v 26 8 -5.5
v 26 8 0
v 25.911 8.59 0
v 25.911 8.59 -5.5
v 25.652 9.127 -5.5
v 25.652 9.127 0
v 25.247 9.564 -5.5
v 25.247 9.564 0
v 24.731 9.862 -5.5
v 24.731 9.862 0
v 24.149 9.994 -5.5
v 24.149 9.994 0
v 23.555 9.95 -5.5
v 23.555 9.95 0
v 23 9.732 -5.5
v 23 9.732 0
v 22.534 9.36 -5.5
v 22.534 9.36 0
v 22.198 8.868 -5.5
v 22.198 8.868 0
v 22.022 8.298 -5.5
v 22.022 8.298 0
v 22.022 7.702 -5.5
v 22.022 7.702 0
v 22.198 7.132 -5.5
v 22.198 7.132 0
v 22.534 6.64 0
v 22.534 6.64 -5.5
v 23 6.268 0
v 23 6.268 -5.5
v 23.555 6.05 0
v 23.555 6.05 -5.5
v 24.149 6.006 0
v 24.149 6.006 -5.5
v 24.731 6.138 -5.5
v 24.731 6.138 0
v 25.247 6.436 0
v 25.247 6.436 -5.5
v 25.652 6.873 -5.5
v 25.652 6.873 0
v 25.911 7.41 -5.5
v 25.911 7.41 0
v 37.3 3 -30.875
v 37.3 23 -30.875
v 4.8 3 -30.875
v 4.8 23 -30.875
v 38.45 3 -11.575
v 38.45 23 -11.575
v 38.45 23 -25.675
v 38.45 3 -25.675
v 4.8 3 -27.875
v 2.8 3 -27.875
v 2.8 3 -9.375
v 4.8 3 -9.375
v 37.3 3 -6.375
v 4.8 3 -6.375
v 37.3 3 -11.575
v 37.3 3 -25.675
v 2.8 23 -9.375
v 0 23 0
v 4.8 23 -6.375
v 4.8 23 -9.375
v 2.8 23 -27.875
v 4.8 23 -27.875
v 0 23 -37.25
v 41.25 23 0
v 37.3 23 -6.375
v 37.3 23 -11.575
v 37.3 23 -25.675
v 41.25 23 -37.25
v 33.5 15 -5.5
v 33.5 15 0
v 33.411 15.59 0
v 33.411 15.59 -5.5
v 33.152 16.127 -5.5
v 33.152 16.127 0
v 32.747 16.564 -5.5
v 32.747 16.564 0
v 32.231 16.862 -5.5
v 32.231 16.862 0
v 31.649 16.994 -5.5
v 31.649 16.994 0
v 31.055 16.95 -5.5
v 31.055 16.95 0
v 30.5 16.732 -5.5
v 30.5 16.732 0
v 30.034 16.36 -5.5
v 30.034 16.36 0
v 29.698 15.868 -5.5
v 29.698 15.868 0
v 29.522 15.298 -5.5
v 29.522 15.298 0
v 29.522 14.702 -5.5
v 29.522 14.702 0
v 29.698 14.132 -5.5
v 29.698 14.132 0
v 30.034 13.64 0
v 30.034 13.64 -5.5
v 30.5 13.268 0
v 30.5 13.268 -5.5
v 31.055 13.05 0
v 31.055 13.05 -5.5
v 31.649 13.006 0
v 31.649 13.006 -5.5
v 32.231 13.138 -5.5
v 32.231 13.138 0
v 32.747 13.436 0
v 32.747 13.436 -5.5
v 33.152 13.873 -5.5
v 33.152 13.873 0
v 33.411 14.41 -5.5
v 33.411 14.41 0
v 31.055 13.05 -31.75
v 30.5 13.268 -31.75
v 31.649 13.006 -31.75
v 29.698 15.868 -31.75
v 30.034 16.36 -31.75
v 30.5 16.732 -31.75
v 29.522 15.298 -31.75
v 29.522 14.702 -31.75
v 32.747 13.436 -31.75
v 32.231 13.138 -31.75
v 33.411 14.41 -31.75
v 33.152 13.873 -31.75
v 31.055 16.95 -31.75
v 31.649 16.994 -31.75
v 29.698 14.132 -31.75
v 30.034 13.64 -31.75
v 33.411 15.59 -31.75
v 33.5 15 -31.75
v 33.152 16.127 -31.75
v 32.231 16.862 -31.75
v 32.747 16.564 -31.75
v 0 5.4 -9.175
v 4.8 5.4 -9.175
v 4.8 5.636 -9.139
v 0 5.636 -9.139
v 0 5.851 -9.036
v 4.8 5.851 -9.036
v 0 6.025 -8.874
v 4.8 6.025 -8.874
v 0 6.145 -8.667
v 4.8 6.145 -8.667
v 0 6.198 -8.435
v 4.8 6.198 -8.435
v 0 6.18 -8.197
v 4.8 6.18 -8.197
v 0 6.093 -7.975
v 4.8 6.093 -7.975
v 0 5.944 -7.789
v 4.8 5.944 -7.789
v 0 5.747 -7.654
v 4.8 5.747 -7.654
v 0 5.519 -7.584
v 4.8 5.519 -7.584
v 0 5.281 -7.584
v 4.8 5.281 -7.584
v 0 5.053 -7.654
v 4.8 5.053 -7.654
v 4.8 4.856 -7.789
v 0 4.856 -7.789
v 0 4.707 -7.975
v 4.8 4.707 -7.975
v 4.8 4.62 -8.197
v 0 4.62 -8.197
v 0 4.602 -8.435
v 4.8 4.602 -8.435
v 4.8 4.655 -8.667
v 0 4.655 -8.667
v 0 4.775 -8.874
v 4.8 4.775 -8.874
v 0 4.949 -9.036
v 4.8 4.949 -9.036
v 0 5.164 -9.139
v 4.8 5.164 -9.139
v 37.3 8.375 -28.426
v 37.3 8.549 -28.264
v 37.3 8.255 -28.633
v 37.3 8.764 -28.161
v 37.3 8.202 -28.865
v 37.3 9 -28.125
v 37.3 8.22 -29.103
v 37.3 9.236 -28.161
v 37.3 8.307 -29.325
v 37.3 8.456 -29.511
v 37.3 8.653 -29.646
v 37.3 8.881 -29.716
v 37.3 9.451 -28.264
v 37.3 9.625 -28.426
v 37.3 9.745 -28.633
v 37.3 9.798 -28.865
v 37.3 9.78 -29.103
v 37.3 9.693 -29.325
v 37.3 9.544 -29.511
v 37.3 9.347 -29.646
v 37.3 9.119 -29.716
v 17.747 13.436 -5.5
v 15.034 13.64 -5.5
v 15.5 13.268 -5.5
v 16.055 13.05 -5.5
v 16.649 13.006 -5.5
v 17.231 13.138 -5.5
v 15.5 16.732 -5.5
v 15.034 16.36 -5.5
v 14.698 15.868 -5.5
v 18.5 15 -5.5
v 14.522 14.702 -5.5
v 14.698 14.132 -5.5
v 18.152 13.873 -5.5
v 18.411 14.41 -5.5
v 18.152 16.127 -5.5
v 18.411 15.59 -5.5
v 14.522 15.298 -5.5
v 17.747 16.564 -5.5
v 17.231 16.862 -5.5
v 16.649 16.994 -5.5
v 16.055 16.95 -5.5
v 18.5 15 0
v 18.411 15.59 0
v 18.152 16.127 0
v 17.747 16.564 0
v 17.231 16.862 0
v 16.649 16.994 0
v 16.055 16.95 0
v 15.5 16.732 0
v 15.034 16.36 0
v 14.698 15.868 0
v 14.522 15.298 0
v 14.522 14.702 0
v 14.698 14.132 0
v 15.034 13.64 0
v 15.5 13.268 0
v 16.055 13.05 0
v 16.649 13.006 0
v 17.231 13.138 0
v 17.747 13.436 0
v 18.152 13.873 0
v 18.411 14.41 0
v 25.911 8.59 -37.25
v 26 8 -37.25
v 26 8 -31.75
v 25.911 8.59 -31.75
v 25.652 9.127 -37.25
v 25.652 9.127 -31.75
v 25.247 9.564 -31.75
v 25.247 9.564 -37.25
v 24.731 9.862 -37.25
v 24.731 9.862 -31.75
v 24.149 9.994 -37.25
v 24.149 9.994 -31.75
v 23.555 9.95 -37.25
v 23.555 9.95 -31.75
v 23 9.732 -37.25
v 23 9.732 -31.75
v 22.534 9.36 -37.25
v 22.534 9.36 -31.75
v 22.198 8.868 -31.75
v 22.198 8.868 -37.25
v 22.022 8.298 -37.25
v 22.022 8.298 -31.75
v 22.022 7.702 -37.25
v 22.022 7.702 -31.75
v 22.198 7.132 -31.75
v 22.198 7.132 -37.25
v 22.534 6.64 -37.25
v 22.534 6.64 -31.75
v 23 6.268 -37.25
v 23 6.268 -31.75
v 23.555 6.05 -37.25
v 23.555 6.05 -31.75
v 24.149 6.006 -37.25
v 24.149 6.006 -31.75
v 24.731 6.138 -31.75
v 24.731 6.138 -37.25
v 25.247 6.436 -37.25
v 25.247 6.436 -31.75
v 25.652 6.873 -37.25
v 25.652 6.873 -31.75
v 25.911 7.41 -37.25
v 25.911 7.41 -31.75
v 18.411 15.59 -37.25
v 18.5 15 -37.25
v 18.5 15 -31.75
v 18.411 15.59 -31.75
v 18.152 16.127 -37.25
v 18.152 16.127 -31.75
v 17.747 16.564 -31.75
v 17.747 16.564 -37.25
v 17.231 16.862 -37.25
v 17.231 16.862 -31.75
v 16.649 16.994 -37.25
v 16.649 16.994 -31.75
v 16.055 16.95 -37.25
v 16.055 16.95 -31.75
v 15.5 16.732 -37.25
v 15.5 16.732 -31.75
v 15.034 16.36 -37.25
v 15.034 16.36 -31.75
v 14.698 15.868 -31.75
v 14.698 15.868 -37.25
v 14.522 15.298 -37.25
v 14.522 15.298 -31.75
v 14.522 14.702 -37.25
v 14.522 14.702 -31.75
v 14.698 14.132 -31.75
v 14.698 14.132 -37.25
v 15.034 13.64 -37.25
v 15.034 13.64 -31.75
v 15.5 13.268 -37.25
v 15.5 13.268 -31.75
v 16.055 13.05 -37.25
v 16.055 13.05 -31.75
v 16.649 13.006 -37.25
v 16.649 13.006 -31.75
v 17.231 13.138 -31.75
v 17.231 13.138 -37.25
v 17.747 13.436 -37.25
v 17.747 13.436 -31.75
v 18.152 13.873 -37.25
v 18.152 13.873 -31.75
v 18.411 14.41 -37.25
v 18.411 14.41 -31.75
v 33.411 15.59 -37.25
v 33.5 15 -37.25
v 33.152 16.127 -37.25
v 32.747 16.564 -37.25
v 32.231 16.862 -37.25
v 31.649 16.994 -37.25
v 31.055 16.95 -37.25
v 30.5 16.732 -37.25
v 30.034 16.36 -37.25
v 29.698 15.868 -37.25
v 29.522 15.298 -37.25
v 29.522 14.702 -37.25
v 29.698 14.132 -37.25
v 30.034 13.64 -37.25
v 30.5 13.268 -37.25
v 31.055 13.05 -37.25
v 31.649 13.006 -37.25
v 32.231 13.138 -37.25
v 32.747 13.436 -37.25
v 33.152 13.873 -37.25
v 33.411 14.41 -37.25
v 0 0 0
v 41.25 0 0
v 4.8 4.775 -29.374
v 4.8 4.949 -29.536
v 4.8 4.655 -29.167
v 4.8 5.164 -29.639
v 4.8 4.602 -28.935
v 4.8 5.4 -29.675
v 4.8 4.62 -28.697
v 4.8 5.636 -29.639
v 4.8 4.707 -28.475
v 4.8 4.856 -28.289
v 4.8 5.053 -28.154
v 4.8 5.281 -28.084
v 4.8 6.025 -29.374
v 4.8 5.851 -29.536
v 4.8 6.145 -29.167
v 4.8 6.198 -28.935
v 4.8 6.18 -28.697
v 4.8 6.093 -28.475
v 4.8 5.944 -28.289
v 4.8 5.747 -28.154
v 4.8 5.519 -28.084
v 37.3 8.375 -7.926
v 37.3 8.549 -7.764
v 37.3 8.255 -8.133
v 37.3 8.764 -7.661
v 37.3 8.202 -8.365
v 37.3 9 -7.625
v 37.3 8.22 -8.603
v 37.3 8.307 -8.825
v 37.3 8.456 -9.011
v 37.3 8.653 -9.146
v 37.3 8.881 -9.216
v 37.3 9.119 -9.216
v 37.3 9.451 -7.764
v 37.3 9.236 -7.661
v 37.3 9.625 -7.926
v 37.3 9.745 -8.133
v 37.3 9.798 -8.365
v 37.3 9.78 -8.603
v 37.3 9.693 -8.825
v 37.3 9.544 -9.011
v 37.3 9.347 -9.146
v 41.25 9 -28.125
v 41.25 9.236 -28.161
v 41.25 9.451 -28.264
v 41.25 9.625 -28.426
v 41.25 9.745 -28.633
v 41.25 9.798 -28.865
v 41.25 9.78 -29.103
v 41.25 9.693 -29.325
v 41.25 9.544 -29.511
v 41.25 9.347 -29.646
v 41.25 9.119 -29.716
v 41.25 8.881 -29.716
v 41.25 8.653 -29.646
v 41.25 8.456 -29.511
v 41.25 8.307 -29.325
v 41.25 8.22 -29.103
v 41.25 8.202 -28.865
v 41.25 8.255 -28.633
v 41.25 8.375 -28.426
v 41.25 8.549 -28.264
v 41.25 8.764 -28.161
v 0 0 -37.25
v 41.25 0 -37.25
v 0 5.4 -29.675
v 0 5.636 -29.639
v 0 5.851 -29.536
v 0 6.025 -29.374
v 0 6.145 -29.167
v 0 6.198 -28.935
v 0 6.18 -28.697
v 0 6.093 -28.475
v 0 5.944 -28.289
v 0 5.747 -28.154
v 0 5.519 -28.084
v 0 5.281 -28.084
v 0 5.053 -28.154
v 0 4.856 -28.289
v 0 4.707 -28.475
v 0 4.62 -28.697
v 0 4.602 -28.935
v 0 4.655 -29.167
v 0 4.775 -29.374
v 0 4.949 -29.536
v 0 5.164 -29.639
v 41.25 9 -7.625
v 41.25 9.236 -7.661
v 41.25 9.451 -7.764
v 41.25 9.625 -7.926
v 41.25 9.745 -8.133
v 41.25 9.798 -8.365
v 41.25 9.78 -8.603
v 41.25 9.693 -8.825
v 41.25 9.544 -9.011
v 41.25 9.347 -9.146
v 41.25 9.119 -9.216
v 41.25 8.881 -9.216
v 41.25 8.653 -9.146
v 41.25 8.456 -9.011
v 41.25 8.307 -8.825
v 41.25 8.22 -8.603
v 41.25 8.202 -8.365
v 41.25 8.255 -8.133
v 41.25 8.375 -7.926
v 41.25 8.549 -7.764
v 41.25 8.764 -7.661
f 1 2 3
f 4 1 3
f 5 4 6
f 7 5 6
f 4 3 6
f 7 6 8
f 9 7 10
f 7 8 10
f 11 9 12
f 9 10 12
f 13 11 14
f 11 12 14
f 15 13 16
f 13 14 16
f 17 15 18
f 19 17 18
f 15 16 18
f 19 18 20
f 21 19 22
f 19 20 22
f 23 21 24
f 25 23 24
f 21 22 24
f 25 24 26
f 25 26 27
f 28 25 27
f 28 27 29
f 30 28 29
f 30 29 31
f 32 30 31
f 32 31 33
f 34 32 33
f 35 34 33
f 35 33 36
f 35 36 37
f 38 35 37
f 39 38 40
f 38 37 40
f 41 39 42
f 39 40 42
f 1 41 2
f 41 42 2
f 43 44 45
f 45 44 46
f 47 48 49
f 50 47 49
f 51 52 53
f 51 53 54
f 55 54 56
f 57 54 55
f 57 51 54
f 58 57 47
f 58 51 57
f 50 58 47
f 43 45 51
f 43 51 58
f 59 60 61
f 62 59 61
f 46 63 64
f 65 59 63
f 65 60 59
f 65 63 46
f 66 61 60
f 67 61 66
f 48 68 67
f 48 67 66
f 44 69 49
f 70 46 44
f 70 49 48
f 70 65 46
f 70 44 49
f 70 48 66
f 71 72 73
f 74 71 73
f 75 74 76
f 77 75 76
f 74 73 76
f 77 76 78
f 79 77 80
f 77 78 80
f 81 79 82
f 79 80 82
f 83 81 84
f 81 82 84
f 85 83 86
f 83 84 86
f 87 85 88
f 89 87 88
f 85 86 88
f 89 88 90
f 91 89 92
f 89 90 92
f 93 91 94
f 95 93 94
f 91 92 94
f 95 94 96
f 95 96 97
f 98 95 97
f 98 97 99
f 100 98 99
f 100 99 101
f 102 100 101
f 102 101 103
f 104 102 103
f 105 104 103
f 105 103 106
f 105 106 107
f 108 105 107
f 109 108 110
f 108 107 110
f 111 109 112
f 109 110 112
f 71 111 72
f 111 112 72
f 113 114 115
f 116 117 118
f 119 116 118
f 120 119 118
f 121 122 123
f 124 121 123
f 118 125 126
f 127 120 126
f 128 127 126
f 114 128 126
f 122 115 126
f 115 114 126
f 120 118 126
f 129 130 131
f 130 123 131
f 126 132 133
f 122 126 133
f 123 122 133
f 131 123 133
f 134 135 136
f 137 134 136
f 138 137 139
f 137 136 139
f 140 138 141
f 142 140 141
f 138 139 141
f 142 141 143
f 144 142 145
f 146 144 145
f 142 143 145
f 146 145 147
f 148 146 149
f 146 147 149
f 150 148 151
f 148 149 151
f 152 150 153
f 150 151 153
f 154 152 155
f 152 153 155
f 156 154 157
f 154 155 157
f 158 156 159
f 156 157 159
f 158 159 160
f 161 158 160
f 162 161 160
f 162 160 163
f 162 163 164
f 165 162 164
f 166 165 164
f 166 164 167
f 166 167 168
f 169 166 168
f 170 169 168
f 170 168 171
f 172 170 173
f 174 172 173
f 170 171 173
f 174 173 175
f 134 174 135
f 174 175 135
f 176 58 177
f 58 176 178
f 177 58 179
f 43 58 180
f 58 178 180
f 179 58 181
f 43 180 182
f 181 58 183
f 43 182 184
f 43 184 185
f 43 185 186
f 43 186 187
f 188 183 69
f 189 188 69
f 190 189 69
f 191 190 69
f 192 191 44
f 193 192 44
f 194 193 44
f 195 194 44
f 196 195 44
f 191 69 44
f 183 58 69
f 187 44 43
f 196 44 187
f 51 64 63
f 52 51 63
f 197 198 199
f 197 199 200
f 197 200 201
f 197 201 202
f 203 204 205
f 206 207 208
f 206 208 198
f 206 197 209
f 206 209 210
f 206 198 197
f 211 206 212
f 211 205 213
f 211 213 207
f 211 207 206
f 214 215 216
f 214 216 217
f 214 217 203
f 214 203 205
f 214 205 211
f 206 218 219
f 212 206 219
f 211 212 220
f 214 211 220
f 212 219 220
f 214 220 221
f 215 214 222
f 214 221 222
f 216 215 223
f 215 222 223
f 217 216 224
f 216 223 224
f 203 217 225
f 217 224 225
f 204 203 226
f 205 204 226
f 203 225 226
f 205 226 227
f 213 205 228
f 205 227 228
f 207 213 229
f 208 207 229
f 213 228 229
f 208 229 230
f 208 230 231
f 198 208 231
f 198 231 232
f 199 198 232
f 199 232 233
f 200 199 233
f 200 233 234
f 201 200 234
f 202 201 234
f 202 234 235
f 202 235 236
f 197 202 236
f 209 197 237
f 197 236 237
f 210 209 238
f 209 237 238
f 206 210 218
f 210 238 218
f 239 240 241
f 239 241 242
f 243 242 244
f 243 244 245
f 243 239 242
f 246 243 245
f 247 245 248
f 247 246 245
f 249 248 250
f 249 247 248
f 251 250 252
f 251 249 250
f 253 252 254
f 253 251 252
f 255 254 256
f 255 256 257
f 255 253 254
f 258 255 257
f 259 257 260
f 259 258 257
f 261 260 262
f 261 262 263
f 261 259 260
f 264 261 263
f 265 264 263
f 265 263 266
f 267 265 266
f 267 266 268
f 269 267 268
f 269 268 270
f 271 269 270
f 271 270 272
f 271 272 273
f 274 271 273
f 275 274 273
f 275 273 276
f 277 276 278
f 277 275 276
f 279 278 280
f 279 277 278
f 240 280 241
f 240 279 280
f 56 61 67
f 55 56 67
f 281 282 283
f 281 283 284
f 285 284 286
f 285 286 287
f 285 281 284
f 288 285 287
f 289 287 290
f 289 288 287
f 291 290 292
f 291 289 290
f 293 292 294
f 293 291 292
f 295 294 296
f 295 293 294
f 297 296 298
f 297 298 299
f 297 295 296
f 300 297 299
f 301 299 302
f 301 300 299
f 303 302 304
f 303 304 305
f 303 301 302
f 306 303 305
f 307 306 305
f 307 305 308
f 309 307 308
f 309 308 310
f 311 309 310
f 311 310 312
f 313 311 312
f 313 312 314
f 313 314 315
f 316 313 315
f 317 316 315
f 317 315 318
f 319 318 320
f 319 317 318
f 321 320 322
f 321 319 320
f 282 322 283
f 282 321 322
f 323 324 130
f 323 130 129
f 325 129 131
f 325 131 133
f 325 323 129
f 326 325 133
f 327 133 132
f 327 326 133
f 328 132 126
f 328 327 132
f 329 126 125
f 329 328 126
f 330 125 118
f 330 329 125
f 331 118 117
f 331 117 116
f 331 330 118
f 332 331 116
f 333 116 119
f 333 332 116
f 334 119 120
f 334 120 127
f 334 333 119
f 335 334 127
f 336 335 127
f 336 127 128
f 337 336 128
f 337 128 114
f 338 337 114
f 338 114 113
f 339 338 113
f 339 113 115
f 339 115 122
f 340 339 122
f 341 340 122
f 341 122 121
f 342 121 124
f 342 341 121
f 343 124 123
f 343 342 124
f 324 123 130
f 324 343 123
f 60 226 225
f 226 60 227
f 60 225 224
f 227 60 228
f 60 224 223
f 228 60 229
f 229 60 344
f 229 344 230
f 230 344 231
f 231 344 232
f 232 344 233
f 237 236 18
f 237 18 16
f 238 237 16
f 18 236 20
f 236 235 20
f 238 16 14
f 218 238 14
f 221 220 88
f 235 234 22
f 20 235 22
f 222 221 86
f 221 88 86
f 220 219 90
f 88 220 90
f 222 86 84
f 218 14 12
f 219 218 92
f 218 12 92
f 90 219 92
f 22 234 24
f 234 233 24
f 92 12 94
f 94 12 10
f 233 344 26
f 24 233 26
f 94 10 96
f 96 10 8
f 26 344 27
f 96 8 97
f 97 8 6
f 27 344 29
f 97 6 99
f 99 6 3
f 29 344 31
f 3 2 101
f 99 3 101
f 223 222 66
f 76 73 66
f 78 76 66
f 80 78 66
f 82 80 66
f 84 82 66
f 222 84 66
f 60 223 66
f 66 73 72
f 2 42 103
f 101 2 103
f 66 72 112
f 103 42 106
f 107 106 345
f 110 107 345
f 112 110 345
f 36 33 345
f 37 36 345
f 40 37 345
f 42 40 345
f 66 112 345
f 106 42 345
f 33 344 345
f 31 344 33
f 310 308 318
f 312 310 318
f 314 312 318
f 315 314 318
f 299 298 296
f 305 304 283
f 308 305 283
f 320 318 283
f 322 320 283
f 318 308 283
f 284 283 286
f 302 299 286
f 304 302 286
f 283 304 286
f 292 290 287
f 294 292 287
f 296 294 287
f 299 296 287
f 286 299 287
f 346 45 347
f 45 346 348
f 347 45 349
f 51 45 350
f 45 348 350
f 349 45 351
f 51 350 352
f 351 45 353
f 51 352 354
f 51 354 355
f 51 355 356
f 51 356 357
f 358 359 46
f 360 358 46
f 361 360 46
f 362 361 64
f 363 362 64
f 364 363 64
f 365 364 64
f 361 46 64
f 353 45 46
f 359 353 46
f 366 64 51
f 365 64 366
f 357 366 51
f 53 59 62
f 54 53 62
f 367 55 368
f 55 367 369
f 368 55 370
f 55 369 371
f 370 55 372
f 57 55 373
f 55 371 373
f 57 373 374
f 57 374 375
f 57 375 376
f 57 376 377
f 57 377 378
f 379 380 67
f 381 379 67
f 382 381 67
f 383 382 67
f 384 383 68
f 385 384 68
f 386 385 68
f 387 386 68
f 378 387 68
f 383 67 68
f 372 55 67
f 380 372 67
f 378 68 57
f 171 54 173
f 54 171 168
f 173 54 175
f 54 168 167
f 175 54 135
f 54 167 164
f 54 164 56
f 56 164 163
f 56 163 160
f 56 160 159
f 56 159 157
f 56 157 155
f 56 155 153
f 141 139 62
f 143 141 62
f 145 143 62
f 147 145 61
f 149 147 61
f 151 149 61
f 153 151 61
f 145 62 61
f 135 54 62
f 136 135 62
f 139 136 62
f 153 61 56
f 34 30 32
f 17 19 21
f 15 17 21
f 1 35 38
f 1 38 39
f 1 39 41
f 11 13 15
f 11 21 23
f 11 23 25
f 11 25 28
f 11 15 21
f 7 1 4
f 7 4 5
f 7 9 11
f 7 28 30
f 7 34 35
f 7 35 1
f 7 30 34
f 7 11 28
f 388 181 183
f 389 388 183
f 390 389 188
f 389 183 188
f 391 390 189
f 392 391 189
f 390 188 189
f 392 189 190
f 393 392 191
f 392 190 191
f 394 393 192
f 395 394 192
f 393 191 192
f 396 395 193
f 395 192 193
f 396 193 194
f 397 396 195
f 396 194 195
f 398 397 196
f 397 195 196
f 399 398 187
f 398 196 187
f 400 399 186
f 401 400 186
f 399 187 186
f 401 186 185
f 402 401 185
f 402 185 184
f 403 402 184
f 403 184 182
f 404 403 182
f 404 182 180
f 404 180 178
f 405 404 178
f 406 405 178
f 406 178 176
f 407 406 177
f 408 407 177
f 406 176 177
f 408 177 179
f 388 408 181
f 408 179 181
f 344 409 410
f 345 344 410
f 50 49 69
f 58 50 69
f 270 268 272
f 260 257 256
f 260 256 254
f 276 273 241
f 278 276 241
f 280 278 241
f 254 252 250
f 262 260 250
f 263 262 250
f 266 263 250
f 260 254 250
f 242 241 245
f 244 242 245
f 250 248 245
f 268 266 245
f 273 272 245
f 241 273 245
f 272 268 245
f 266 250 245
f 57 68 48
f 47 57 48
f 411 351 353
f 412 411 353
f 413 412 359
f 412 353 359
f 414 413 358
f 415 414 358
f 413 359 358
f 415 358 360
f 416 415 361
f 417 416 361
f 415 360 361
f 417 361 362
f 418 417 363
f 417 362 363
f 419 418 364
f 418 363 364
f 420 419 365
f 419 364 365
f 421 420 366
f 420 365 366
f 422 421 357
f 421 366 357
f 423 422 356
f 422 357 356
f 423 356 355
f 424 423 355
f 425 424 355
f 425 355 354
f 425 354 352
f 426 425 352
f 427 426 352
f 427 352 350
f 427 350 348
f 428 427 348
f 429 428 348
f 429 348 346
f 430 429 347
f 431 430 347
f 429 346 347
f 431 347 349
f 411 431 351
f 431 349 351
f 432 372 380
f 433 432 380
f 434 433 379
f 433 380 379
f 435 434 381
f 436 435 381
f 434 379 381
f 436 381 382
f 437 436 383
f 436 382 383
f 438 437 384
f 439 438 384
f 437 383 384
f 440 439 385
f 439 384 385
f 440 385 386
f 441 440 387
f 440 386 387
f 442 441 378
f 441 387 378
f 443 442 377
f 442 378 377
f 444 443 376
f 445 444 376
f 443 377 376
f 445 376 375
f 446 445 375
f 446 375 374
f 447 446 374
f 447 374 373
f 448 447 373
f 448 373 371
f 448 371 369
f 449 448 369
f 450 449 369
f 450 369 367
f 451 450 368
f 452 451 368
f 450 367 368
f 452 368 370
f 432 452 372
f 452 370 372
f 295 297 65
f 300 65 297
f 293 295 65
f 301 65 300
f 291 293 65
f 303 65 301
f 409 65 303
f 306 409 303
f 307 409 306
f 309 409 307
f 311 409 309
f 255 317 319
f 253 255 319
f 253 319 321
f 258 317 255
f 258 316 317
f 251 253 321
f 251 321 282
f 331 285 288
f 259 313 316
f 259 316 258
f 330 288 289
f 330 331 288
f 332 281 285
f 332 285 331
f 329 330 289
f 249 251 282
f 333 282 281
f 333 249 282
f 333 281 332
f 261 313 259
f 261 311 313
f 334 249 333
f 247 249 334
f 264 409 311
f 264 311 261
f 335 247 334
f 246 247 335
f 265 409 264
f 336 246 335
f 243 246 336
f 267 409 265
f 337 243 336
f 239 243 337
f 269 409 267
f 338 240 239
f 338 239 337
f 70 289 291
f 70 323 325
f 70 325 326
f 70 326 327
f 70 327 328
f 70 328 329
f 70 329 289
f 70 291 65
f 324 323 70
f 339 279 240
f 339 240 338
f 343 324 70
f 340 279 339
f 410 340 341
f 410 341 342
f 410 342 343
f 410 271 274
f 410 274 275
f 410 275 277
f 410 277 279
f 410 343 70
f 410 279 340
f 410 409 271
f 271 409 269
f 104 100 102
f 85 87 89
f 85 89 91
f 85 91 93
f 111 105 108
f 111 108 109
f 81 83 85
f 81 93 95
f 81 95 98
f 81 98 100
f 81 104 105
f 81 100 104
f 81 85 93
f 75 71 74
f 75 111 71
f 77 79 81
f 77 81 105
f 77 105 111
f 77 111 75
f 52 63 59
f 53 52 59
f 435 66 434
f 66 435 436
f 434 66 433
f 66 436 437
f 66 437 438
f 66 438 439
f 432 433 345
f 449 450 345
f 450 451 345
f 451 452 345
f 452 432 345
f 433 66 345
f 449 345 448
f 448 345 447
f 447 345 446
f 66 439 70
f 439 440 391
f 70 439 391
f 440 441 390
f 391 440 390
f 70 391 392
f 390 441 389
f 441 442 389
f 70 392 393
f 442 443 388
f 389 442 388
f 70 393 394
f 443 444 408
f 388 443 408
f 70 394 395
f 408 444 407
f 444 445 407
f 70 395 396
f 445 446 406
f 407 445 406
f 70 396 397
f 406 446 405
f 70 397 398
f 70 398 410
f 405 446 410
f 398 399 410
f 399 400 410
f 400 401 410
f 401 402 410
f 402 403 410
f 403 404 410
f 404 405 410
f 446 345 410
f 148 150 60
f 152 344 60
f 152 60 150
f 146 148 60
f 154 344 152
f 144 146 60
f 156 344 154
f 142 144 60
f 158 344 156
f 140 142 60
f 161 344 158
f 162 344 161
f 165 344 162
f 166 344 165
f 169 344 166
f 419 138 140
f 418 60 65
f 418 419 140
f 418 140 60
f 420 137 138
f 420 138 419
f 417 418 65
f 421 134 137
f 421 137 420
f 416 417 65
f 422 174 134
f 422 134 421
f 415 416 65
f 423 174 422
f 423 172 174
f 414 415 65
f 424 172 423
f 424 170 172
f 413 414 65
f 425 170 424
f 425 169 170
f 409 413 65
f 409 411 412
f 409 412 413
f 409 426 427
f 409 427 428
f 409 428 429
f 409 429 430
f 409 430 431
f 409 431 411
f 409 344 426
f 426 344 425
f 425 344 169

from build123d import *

# Parameters (mm, degrees)
SKETCH1_W           = 41.25
SKETCH1_H           = 37.25
BOSS_EXTRUDE1_DEPTH = 23
CUT_EXTRUDE1_DEPTH  = 20
SKETCH3_R           = 0.8
CUT_EXTRUDE2_DEPTH  = 3.95
SKETCH4_R           = 0.8
CUT_EXTRUDE3_DEPTH  = 4.8
SKETCH5_R           = 2
CUT_EXTRUDE4_DEPTH  = 5.5


with BuildPart() as part:
    # Sketch1 → Boss-Extrude1 (new body)
    with BuildSketch(Plane(origin=(0, 0, 0), x_dir=(1, 0, 0), z_dir=(0, 1, 0))):
        with Locations((20.625, 18.625)):
            Rectangle(SKETCH1_W, SKETCH1_H)
    extrude(amount=BOSS_EXTRUDE1_DEPTH)

    # Sketch2 → Cut-Extrude1 (cut)
    with BuildSketch(Plane(origin=(0, 23, 0), x_dir=(1, 0, 0), z_dir=(0, 1, 0))):
        Polygon((37.3, 30.875), (4.8, 30.875), (4.8, 27.875), (2.8, 27.875), (2.8, 9.375), (4.8, 9.375), (4.8, 6.375), (37.3, 6.375), (37.3, 11.575), (38.45, 11.575), (38.45, 25.675), (37.3, 25.675), align=None)
    extrude(amount=-CUT_EXTRUDE1_DEPTH, mode=Mode.SUBTRACT)

    # Sketch3 → Cut-Extrude2 (cut)
    with BuildSketch(Plane.ZY.offset(-37.3)):
        with Locations((-28.925, 9)):
            Circle(SKETCH3_R)
        with Locations((-8.425, 9)):
            Circle(SKETCH3_R)
    extrude(amount=-CUT_EXTRUDE2_DEPTH, mode=Mode.SUBTRACT)

    # Sketch4 → Cut-Extrude3 (cut)
    with BuildSketch(Plane(origin=(4.8, 0, 0), x_dir=(0, 0, -1), z_dir=(1, 0, 0))):
        with Locations((28.875, 5.4)):
            Circle(SKETCH4_R)
        with Locations((8.375, 5.4)):
            Circle(SKETCH4_R)
    extrude(amount=-CUT_EXTRUDE3_DEPTH, mode=Mode.SUBTRACT)

    # Sketch5 → Cut-Extrude4 (cut)
    with BuildSketch(Plane.XY):
        with Locations((16.5, 15)):
            Circle(SKETCH5_R)
        with Locations((31.5, 15)):
            Circle(SKETCH5_R)
        with Locations((24, 8)):
            Circle(SKETCH5_R)
    cut_extrude4 = extrude(amount=-CUT_EXTRUDE4_DEPTH, mode=Mode.SUBTRACT)

    # Mirror1: Cut-Extrude4 across plane
    add(cut_extrude4.mirror(Plane.XY.offset(-18.625)), mode=Mode.SUBTRACT)


solid = part.part
